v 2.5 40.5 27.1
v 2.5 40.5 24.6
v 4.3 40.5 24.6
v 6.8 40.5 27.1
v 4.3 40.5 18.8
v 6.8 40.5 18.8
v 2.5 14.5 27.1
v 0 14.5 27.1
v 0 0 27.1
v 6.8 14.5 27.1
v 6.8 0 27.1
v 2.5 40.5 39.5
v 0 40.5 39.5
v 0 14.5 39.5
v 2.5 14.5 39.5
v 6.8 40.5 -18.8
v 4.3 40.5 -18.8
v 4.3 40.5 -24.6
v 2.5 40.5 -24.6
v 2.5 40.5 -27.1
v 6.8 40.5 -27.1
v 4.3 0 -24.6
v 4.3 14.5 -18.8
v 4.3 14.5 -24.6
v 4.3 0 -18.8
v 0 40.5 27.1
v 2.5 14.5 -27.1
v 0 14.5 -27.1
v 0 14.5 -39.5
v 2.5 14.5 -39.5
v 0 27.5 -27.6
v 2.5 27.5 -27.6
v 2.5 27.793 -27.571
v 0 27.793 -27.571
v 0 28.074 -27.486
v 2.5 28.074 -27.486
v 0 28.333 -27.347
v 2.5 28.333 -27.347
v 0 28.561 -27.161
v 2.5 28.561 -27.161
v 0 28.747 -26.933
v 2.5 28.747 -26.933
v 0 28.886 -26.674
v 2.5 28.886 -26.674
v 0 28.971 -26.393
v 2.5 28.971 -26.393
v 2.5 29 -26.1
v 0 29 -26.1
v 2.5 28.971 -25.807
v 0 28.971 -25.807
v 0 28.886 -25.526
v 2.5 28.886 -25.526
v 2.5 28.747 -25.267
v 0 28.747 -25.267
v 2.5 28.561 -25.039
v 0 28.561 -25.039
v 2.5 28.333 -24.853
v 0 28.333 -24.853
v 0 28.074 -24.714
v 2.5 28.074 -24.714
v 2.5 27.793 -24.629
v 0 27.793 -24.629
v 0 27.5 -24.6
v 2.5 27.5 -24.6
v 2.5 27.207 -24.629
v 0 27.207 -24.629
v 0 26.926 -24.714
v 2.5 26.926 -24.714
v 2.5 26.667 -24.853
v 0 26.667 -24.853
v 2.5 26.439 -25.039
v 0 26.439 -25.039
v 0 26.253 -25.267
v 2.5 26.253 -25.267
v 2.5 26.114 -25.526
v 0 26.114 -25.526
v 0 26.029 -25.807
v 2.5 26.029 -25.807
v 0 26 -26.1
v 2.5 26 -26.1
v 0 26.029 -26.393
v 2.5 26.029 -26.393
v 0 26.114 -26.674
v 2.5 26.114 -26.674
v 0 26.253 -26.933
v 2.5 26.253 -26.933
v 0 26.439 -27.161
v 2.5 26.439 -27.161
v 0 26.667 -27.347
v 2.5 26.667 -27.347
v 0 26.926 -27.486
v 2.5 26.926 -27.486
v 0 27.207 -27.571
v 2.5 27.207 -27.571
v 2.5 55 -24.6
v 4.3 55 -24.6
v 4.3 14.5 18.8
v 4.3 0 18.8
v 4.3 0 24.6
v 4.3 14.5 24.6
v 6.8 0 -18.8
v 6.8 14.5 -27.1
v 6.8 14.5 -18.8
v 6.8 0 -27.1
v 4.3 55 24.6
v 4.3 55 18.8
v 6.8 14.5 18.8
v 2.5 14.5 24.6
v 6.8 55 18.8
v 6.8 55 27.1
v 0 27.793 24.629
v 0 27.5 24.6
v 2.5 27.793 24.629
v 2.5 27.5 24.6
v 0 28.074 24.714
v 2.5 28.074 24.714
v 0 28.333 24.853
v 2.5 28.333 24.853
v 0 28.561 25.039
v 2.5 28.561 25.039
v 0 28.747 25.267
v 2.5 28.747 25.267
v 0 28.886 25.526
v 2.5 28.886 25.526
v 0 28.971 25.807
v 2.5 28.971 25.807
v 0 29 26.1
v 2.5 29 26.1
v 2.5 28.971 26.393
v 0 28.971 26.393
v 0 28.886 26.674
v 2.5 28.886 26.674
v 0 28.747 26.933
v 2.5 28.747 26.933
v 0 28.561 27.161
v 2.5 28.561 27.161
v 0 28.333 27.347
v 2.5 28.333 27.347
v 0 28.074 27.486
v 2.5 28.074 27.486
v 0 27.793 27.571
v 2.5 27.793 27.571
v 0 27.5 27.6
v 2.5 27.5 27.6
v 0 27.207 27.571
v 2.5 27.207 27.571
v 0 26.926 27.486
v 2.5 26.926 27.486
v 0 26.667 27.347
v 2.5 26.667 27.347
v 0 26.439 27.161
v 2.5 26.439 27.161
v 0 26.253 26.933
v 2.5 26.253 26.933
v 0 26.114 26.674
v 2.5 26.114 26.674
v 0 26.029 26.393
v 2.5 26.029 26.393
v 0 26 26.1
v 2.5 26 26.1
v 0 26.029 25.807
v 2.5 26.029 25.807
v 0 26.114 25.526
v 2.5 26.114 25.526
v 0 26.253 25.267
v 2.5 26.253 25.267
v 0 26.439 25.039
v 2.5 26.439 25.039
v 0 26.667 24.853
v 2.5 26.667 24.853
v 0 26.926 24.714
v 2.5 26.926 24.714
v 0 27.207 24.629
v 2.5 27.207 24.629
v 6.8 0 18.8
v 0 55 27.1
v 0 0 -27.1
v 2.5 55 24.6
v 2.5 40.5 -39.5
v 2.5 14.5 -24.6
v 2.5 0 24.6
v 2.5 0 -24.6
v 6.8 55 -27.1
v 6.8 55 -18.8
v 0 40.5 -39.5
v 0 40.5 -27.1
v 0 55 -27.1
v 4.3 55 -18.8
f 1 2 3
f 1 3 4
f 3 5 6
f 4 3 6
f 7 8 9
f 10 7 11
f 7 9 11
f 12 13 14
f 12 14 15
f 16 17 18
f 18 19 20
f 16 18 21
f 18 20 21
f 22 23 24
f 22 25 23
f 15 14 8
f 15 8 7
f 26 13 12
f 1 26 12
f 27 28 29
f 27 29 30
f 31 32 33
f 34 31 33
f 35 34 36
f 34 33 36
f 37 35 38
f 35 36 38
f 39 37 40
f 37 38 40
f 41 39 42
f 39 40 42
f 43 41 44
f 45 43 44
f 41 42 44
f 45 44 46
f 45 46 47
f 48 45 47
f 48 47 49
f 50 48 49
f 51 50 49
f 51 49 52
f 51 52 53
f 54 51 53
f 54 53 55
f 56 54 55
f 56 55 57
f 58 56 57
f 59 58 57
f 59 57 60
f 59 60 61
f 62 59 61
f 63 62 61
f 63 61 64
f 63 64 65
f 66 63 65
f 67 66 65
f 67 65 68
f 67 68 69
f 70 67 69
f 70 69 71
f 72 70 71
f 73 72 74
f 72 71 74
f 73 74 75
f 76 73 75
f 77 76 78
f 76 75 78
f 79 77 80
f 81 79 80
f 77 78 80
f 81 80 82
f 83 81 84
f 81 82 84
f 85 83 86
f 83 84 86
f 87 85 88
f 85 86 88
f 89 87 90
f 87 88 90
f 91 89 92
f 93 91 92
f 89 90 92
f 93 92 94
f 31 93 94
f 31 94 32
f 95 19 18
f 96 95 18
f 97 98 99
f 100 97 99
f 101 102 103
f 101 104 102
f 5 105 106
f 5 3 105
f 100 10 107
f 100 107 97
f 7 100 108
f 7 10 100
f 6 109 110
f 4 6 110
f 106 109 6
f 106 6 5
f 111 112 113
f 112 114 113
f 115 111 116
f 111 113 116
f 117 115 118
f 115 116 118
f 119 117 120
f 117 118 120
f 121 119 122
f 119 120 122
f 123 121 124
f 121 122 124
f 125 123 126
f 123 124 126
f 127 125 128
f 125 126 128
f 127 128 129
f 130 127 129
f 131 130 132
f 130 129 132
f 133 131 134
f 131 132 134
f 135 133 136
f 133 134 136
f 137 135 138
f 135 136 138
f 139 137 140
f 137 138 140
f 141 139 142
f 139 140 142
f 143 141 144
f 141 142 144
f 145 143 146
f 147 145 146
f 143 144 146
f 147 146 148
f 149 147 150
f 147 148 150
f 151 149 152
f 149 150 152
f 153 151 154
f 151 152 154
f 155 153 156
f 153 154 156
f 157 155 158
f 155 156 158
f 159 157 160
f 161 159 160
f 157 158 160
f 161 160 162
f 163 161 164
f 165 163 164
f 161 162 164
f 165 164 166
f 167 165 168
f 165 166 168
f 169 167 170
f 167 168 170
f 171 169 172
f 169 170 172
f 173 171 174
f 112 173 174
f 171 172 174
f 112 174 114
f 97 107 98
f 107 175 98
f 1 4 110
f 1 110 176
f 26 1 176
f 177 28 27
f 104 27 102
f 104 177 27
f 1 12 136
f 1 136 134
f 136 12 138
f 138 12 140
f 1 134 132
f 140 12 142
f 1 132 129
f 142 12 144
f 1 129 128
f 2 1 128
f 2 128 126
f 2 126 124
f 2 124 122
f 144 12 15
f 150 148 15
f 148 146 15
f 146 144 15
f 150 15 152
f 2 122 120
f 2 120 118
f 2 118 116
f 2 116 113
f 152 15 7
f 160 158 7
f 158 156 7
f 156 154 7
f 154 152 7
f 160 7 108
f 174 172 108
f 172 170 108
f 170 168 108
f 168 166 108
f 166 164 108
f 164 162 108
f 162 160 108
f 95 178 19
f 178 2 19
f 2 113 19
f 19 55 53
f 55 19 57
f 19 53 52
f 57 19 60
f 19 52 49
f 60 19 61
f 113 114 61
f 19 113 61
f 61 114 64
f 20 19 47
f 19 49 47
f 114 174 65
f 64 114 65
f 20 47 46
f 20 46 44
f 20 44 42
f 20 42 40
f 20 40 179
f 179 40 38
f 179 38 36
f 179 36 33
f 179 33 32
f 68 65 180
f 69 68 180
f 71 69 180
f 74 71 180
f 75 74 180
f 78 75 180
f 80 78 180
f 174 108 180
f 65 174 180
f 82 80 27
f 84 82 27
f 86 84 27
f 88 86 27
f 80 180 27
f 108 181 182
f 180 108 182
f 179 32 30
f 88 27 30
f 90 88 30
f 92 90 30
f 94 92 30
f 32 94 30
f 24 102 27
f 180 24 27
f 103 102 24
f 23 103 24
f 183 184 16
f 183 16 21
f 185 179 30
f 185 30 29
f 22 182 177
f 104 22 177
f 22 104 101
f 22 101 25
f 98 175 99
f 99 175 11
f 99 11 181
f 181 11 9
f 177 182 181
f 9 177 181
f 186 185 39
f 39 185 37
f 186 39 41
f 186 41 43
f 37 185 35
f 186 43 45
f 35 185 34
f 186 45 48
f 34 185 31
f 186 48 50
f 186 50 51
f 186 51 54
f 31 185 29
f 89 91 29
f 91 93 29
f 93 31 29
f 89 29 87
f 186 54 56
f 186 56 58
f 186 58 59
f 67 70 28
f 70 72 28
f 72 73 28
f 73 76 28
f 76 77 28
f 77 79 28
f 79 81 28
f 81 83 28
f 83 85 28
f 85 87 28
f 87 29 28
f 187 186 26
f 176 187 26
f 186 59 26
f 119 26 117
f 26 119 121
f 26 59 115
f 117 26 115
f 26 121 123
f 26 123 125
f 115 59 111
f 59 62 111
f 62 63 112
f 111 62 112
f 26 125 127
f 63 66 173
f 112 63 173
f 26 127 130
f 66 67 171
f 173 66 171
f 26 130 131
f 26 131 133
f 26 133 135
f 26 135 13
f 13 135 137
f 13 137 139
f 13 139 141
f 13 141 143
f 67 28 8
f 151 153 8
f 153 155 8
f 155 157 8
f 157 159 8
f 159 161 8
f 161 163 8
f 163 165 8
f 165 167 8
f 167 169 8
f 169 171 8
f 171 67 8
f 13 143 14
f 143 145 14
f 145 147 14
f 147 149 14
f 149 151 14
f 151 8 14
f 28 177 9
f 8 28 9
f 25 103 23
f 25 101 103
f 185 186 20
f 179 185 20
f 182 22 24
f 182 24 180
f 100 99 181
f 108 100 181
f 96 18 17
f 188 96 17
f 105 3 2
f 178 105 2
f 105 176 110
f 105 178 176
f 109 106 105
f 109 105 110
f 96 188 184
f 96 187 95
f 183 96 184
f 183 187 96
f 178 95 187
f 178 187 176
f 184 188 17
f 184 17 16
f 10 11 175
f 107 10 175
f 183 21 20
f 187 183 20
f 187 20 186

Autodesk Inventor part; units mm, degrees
ref_plane "YZ Plane" through (0, 0, 0) normal (1, 0, 0) x (0, 1, 0)
ref_plane "XZ Plane" through (0, 0, 0) normal (0, 1, 0) x (-1, 0, 0)
ref_plane "XY Plane" through (0, 0, 0) normal (0, 0, 1) x (1, 0, 0)
sketch "Sketch1" plane through (0, 0, 0) normal (0, 1, 0) x (-1, 0, 0)
  line L0 (0, 27.1) -> (0, -27.1)
  line L1 (0, 27.1) -> (-6.8, 27.1)
  line L2 (-6.8, 27.1) -> (-6.8, 18.8)
  line L3 (-6.8, 18.8) -> (-4.3, 18.8)
  line L4 (-4.3, 18.8) -> (-4.3, 24.6)
  line L5 (-4.3, 24.6) -> (-2.5, 24.6)
  line L6 (-2.5, 24.6) -> (-2.5, 0)
  line L7 (0, -27.1) -> (-6.8, -27.1)
  line L8 (-6.8, -27.1) -> (-6.8, -18.8)
  line L9 (-6.8, -18.8) -> (-4.3, -18.8)
  line L10 (-4.3, -18.8) -> (-4.3, -24.6)
  line L11 (-4.3, -24.6) -> (-2.5, -24.6)
  line L12 (-2.5, -24.6) -> (-2.5, 0)
  point P0 (0, 0)
  dimension "d0" = 54.2
  dimension "d1" = 6.8
  dimension "d2" = 8.3
  dimension "d3" = 2.5
  dimension "d4" = 5.8
  dimension "d5" = 1.8
  dimension "d6" = 8.3
  dimension "d7" = 5.8
extrude "Extrusion1" add sketch "Sketch1" along normal blind 14.5
sketch "Sketch2" plane through (0, 14.5, 0) normal (0, 1, 0) x (1, 0, 0)
  line L0 (2.5, -24.6) -> (2.5, 24.6) projected
  line L1 (2.5, 0) -> (2.5, 39.5)
  line L2 (2.5, 39.5) -> (0, 39.5)
  line L3 (0, 39.5) -> (0, 0)
  line L4 (0, 0) -> (0, -39.5)
  line L5 (0, 27.1) -> (0, -27.1) projected
  line L6 (0, -39.5) -> (2.5, -39.5)
  line L7 (2.5, -39.5) -> (2.5, 0)
  dimension "d10" = 39.5
  dimension "d11" = 39.5
extrude "Extrusion2" add sketch "Sketch2" along normal blind 26
sketch "Sketch3" plane through (0, 40.5, 0) normal (0, 1, 0) x (1, 0, 0)
  line L0 (2.5, -24.6) -> (2.5, 24.6) projected
  line L1 (2.5, 0) -> (2.5, 24.6558)
  line L2 (0, 27.1) -> (0, -27.1) projected
  line L3 (4.3, -24.6) -> (2.5, -24.6) projected
  line L4 (6.8, -18.8) -> (4.3, -18.8) projected
  line L5 (4.3, -24.6) -> (4.3, -18.8)
  line L6 (4.3, -18.8) -> (6.8, -18.8)
  line L7 (6.8, -18.8) -> (6.8, -27.1)
  line L8 (6.8, -27.1) -> (2.5, -27.1)
  line L9 (2.5, 0) -> (2.5, 24.6558)
  line L10 (2.5, 24.6) -> (4.3, 24.6) projected
  line L11 (4.3, 18.8) -> (6.8, 18.8) projected
  line L12 (4.3, 24.6) -> (4.3, 18.8)
  line L13 (4.3, 18.8) -> (6.8, 18.8)
  line L14 (6.8, 18.8) -> (6.8, 27.1)
  line L15 (6.8, 27.1) -> (0, 27.1)
  line L16 (0, 27.1) -> (0, -27.1)
  line L17 (6.8, -27.1) -> (0, -27.1)
  line L18 (4.3, -24.6) -> (2.5, -24.6)
  point P0 (0, 0)
extrude "Extrusion3" add sketch "Sketch3" along normal blind 14.5
sketch "Sketch4" plane through (2.5, 0, 24.6) normal (1, 0, 0) x (0, 0, -1)
  line L0 (64.1, 14.5) -> (64.1, 40.5) projected
  line L1 (64.1, 27.5) -> (50.7, 27.5)
  circle A0 centre (50.7, 27.5) radius 1.5
  line L2 (-14.9, 14.5) -> (-14.9, 40.5) projected
  line L3 (-14.9, 27.5) -> (-1.5, 27.5)
  circle A1 centre (-1.5, 27.5) radius 1.5
  point P0 (24.6, 0)
  dimension "d16" = 13.4
  dimension "d17" = 3
  dimension "d18" = 13.4
  dimension "d19" = 3
extrude "Extrusion4" cut sketch "Sketch4" against normal blind 4.5
properties part number "cam_holder2"
